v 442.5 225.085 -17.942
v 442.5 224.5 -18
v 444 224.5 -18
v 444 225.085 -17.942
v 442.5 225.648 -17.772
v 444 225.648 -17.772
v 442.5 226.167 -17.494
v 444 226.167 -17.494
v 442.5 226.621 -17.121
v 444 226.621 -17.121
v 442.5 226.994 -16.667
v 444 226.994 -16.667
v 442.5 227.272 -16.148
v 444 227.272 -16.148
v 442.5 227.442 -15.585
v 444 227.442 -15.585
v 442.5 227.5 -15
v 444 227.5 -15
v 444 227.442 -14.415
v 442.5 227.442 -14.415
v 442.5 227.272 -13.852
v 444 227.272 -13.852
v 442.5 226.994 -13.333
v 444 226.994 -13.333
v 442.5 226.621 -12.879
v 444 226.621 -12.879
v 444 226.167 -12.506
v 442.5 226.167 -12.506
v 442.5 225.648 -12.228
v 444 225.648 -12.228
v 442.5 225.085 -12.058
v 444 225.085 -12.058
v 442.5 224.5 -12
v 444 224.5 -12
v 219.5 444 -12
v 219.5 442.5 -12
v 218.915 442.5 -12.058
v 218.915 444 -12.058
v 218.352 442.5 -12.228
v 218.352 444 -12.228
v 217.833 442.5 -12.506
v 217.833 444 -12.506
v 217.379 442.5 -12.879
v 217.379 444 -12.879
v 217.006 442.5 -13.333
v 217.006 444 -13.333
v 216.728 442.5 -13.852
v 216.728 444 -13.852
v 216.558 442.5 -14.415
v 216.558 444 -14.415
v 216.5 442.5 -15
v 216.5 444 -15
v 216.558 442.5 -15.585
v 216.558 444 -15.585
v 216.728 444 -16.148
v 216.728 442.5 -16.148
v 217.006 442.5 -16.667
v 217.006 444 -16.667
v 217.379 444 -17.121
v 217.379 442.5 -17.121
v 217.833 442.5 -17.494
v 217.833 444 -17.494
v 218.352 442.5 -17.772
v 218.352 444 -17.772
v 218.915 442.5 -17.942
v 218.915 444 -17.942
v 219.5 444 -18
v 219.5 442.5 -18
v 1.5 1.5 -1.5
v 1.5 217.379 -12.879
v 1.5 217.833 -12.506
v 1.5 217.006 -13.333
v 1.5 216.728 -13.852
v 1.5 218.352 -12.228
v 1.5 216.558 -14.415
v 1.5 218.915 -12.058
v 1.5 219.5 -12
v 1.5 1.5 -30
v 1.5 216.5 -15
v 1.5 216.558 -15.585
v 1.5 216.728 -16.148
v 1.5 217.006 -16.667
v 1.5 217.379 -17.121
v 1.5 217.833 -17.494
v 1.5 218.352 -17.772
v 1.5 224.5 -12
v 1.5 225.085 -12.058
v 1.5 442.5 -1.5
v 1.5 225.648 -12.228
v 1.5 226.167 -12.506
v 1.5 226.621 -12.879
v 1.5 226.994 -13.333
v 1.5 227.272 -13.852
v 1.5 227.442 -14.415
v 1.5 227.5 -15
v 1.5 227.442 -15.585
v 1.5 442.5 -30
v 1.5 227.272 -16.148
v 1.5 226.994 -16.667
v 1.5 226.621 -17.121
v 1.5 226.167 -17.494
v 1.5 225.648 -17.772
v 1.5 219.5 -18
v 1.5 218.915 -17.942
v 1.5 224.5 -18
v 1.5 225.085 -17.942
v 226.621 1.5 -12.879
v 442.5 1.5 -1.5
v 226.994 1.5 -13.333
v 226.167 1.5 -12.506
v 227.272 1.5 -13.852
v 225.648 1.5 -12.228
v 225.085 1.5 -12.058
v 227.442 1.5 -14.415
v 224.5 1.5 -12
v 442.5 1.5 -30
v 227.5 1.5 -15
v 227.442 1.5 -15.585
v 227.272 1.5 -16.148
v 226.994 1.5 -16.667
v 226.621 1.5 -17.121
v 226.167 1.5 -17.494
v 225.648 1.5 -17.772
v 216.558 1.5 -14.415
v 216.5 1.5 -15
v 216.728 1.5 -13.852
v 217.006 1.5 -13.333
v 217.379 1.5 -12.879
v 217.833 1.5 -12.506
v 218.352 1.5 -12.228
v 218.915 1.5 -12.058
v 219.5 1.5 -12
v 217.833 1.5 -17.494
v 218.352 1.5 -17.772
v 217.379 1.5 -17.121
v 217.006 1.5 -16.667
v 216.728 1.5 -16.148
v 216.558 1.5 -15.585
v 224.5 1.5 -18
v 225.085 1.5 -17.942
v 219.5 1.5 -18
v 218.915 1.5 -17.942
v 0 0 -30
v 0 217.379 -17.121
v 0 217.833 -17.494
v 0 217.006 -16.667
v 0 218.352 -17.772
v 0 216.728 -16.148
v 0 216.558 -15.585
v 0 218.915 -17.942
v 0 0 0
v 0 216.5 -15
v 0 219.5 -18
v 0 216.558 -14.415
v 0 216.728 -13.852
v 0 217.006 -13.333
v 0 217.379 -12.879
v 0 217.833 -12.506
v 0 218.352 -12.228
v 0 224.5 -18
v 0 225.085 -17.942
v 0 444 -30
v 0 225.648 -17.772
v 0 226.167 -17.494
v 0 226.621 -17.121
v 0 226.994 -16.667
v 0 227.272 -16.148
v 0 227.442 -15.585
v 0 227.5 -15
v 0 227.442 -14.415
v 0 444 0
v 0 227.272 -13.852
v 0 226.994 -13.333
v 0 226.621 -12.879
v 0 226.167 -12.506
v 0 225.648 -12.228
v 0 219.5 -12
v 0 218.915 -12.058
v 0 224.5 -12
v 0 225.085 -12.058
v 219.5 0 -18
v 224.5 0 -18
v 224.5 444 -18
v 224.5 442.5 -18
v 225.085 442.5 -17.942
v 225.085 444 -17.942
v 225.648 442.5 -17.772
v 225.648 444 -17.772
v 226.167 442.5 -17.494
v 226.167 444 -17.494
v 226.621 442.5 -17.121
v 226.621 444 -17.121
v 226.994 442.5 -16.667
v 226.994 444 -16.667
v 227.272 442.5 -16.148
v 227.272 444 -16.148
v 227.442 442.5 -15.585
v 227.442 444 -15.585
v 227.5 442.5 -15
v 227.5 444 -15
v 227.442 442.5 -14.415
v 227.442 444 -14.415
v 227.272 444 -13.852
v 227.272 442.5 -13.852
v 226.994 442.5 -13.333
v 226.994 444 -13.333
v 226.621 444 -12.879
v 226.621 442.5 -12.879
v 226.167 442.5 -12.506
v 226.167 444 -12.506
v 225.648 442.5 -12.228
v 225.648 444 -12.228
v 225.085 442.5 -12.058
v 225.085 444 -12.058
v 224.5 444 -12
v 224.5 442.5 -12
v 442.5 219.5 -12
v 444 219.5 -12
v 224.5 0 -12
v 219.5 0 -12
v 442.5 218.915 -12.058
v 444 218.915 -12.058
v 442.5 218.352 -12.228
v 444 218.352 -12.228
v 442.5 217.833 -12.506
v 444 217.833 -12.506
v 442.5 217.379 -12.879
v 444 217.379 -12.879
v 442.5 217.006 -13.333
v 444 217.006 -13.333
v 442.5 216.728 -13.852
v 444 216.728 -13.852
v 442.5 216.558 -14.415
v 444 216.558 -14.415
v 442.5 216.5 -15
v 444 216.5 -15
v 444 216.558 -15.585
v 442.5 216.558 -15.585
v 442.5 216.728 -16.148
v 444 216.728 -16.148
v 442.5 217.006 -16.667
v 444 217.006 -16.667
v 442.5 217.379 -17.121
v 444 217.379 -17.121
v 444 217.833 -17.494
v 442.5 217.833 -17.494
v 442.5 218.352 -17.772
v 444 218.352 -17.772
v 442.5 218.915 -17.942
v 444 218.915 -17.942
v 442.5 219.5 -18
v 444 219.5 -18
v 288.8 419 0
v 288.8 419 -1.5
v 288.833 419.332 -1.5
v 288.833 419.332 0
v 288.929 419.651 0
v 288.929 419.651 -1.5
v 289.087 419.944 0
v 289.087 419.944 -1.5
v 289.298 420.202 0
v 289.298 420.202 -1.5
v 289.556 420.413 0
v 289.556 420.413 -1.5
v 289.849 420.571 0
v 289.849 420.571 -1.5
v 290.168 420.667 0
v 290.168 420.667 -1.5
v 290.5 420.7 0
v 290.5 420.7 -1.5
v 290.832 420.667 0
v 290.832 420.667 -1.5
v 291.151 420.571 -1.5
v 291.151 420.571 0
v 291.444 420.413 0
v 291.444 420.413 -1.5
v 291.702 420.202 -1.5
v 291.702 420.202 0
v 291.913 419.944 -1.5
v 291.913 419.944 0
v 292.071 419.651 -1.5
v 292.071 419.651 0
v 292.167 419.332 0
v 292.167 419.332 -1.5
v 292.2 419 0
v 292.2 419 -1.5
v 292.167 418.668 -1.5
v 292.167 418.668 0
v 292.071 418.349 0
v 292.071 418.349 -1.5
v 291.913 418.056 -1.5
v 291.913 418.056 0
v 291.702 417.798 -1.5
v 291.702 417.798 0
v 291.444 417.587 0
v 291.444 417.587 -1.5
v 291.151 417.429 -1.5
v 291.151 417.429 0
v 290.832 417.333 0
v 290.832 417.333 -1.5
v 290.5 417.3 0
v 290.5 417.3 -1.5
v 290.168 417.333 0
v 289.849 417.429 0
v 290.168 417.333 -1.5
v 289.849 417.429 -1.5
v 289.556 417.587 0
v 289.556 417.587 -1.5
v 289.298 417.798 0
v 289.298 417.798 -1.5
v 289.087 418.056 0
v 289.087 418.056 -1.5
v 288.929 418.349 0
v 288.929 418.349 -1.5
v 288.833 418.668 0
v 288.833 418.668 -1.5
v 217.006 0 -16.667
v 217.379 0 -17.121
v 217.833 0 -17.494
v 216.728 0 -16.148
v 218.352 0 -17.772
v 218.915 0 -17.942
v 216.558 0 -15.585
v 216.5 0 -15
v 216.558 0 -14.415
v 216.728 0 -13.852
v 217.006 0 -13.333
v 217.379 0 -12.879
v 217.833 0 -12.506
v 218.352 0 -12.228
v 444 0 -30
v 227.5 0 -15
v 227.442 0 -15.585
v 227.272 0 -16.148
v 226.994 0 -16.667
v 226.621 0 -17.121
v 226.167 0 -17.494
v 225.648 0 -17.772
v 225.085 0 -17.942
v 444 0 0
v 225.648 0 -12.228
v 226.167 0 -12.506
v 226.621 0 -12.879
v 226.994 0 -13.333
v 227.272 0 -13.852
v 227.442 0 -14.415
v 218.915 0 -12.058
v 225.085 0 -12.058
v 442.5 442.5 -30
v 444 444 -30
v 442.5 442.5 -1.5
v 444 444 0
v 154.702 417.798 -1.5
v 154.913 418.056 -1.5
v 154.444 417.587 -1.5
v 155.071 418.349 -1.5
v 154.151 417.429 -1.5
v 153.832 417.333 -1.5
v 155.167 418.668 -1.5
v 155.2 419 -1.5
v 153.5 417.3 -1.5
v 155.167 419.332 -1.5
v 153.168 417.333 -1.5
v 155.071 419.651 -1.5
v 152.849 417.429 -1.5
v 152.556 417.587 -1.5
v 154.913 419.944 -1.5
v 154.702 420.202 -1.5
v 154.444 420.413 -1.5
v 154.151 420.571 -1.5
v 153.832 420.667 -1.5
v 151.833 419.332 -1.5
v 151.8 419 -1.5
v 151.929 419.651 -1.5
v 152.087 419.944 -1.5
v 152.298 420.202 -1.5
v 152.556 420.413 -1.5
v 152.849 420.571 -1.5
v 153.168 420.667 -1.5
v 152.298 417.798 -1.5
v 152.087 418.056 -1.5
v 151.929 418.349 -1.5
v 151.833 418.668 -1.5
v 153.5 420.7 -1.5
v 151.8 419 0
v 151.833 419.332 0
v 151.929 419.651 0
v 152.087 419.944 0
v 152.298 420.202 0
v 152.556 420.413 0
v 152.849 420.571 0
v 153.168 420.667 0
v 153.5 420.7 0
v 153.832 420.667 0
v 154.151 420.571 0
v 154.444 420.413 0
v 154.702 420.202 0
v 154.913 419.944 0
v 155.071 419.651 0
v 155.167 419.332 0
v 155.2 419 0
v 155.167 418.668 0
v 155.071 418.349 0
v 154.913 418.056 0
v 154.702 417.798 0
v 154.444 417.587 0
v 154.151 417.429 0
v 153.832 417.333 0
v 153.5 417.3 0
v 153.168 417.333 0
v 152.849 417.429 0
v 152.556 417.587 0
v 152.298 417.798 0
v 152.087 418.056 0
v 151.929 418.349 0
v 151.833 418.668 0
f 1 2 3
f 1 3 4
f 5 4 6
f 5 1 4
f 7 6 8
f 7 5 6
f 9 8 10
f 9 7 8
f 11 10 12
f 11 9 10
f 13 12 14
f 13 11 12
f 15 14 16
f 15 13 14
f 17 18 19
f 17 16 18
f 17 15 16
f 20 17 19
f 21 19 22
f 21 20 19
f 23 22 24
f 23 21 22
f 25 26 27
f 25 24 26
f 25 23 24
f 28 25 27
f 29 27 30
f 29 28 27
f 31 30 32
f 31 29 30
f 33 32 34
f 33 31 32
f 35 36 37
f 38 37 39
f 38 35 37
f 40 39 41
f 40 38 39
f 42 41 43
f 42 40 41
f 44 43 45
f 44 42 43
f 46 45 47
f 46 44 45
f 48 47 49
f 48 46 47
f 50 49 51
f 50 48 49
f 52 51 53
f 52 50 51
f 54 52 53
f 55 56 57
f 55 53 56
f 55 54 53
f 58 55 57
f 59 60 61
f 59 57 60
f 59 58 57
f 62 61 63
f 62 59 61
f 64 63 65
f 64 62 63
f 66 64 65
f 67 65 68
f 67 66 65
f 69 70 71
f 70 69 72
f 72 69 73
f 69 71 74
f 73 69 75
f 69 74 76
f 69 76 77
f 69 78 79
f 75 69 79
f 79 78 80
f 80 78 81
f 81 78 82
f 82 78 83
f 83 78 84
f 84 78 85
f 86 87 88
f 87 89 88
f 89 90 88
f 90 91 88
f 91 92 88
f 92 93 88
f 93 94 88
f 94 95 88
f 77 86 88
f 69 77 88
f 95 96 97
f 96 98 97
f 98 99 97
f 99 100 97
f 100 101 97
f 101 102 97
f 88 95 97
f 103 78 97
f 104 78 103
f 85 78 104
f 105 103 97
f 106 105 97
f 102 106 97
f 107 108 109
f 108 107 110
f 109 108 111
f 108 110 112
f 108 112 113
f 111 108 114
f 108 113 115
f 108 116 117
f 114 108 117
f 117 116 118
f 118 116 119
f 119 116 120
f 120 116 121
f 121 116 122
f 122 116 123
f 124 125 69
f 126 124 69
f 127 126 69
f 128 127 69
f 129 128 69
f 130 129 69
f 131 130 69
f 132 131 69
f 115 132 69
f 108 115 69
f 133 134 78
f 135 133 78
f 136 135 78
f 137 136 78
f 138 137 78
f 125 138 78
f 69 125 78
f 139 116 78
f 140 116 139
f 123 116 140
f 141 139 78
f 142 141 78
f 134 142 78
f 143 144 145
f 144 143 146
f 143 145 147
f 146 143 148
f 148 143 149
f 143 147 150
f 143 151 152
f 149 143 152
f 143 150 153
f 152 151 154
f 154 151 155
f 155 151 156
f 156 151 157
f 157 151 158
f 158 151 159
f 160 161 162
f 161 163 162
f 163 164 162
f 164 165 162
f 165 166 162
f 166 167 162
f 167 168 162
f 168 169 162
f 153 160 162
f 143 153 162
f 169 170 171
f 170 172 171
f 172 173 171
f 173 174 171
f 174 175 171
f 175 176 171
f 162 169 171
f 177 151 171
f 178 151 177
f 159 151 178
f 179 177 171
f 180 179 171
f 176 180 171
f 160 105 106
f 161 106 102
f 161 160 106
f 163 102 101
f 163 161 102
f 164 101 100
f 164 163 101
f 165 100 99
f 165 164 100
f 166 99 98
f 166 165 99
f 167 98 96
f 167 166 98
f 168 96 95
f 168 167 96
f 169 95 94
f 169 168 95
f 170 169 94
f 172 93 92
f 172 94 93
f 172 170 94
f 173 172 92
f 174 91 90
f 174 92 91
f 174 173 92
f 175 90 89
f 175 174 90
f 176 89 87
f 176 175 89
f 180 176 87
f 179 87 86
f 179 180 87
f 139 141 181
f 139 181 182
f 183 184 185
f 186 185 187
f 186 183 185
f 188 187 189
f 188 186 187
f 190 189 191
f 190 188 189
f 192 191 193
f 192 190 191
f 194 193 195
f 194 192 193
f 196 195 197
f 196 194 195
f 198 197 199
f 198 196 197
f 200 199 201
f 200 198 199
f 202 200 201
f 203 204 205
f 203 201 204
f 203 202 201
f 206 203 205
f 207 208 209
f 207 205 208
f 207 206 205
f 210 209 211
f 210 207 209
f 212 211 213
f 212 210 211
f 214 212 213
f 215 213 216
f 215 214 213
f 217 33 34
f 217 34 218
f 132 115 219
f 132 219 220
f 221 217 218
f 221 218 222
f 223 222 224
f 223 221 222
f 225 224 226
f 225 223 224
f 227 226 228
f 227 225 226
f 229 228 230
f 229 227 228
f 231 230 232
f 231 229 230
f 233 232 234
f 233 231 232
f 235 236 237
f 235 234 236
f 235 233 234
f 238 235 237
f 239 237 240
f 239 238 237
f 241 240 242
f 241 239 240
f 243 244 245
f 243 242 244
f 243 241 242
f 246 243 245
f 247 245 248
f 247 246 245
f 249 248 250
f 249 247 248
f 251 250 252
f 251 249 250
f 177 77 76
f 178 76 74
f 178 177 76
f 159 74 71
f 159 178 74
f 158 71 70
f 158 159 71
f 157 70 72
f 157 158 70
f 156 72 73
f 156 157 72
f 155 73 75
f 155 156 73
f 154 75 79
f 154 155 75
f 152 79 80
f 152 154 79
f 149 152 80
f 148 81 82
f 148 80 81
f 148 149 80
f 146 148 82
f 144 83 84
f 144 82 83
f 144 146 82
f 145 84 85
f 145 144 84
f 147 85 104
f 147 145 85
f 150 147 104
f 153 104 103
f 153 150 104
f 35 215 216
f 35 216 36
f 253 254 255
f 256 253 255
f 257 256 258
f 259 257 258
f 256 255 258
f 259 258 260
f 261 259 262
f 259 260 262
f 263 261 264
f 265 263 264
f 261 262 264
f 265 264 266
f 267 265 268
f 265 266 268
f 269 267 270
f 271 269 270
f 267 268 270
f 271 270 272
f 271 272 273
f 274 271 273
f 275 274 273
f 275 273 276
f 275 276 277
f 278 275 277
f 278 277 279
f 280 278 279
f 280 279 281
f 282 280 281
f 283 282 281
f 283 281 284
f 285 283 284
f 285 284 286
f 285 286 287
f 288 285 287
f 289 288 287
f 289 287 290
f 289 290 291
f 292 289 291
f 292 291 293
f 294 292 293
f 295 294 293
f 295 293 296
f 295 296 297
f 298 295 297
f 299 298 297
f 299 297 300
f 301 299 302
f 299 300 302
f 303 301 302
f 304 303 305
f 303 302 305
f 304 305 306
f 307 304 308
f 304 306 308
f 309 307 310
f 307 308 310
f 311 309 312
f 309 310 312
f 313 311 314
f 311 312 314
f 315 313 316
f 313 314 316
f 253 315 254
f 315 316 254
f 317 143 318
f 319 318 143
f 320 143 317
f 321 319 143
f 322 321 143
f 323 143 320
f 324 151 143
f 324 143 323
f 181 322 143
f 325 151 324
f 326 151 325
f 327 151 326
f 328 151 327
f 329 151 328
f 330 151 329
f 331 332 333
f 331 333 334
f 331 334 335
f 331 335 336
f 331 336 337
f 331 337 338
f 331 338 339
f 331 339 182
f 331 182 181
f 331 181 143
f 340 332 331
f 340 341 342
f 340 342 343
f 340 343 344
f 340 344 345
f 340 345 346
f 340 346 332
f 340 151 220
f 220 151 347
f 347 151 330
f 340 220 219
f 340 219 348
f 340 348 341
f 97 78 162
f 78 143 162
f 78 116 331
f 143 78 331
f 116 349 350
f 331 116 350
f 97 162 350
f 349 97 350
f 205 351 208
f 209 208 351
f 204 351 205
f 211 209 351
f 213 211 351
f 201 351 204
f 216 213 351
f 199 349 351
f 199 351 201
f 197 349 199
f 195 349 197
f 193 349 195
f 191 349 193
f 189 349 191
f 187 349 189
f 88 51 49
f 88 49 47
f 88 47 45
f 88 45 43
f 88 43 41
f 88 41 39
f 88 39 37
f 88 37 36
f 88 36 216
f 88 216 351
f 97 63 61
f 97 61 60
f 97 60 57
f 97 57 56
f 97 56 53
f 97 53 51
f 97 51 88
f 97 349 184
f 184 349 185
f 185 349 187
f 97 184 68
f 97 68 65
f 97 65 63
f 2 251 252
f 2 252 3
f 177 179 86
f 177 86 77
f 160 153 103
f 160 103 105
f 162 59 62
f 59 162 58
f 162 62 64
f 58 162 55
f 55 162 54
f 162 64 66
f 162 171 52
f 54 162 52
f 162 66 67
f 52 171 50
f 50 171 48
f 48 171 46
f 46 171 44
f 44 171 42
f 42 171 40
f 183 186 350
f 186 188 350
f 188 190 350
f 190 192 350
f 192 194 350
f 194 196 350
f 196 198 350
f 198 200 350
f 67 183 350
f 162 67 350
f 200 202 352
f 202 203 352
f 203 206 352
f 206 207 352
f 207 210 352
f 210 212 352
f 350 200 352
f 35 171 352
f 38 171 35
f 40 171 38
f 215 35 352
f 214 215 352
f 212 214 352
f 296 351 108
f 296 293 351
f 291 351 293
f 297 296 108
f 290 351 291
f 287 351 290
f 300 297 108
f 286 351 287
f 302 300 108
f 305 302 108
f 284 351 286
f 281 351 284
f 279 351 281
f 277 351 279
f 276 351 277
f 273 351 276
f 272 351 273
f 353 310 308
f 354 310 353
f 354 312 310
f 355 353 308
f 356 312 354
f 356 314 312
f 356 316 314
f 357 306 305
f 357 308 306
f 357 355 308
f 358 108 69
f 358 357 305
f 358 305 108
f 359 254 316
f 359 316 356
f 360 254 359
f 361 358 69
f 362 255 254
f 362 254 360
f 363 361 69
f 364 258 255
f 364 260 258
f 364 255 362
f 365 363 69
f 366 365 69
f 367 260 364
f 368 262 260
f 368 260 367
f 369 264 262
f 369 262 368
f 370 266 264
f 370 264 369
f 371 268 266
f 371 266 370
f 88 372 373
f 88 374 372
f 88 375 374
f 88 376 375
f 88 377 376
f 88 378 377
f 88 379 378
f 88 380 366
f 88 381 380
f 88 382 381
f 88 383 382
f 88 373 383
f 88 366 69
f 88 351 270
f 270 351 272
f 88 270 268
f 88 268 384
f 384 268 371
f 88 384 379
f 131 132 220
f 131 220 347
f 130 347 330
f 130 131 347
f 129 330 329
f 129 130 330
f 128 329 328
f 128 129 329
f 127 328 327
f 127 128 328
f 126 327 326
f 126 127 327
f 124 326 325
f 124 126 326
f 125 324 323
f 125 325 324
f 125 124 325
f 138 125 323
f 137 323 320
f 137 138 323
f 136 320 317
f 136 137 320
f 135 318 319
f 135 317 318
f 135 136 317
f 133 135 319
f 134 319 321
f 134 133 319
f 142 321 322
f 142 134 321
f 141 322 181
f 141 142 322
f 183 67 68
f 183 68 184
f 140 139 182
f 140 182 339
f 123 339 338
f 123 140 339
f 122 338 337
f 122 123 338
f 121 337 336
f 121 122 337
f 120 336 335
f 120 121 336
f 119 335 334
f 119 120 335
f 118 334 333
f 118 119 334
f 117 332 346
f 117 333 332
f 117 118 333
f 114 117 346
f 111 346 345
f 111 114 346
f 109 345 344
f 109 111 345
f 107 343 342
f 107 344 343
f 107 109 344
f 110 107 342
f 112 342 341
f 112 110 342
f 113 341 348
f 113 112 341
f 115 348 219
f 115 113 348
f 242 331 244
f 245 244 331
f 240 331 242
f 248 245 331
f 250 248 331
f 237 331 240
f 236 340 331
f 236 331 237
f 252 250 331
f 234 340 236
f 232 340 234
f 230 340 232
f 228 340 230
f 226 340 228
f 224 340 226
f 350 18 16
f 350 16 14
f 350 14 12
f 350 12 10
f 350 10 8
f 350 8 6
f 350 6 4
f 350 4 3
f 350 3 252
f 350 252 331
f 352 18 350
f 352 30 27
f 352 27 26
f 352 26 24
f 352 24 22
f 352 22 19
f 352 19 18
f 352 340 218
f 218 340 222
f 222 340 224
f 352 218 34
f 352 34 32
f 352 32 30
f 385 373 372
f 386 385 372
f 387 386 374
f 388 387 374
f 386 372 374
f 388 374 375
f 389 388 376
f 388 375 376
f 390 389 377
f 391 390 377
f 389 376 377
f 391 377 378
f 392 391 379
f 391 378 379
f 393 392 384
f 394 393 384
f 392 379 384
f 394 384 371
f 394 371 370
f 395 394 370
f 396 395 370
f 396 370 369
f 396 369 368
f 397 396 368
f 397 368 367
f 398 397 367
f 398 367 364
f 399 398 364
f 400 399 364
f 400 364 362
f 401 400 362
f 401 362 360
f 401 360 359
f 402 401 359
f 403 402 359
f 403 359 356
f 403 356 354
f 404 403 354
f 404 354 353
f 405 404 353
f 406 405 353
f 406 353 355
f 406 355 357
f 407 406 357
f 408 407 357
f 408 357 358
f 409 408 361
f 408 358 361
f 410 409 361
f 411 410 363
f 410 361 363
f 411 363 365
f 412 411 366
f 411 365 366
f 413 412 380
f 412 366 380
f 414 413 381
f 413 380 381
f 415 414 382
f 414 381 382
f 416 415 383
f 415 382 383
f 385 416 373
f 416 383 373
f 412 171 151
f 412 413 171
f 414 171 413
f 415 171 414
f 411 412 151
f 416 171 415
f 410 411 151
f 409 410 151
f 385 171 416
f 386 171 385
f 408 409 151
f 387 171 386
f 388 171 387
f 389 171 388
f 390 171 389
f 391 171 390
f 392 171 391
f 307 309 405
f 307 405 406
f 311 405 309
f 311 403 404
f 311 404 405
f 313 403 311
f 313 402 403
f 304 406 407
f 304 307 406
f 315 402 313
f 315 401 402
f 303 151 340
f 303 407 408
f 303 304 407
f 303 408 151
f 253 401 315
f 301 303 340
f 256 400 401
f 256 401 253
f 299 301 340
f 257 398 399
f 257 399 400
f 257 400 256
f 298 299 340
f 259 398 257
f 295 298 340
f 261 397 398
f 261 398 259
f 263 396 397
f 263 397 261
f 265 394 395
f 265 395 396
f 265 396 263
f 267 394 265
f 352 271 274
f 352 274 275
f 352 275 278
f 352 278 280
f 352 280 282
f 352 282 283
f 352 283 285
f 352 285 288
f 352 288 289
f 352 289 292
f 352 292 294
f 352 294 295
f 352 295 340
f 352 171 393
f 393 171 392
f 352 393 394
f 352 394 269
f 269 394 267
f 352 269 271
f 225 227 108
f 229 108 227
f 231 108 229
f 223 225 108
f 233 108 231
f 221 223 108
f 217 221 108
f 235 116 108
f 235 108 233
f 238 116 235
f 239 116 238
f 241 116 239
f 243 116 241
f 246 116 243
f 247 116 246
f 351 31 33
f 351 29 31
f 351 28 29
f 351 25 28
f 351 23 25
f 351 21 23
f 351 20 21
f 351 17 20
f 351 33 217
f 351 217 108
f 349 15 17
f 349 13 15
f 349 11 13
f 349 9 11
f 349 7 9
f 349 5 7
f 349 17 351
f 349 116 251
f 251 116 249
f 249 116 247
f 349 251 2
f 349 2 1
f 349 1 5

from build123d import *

# Parameters (mm, degrees)
SCHIZZO1_W                   = 444
SCHIZZO1_H                   = 444
ESTRUSIONE_ESTRUSIONE1_DEPTH = 30
SCHIZZO2_R                   = 1.7
TAGLIO_ESTRUSIONE1_DEPTH     = 629.627075459
SCHIZZO3_W                   = 441
SCHIZZO3_H                   = 441
TAGLIO_ESTRUSIONE2_DEPTH     = 28.5
TAGLIO_ESTRUSIONE3_DEPTH     = 629.627075459
TAGLIO_ESTRUSIONE4_DEPTH     = 629.627075459


with BuildPart() as part:
    # Schizzo1 → Estrusione-Estrusione1 (new body)
    with BuildSketch(Plane.XY):
        with Locations((222, 222)):
            Rectangle(SCHIZZO1_W, SCHIZZO1_H)
    extrude(amount=-ESTRUSIONE_ESTRUSIONE1_DEPTH)

    # Schizzo2 → Taglio-Estrusione1 (cut, through all)
    with BuildSketch(Plane(origin=(0, 0, -30), x_dir=(-1, 0, 0), z_dir=(0, 0, -1))):
        with Locations((-290.5, 419)):
            Circle(SCHIZZO2_R)
        with Locations((-153.5, 419)):
            Circle(SCHIZZO2_R)
    extrude(amount=-TAGLIO_ESTRUSIONE1_DEPTH, mode=Mode.SUBTRACT)

    # Schizzo3 → Taglio-Estrusione2 (cut)
    with BuildSketch(Plane(origin=(0, 0, -30), x_dir=(-1, 0, 0), z_dir=(0, 0, -1))):
        with Locations((-222, 222)):
            Rectangle(SCHIZZO3_W, SCHIZZO3_H)
    extrude(amount=-TAGLIO_ESTRUSIONE2_DEPTH, mode=Mode.SUBTRACT)

    # Schizzo4 → Taglio-Estrusione3 (cut, through all)
    with BuildSketch(Plane(origin=(0, 444, 0), x_dir=(1, 0, 0), z_dir=(0, 1, 0))):
        with BuildLine():
            Line((224.5, 12), (219.5, 12))
            ThreePointArc((219.5, 12), (216.5, 15), (219.5, 18))
            Line((219.5, 18), (224.5, 18))
            ThreePointArc((224.5, 18), (227.5, 15), (224.5, 12))
        make_face()
    extrude(amount=-TAGLIO_ESTRUSIONE3_DEPTH, mode=Mode.SUBTRACT)

    # Schizzo5 → Taglio-Estrusione4 (cut, through all)
    with BuildSketch(Plane.ZY):
        with BuildLine():
            Line((-12, 224.5), (-12, 219.5))
            ThreePointArc((-12, 219.5), (-15, 216.5), (-18, 219.5))
            Line((-18, 219.5), (-18, 224.5))
            ThreePointArc((-18, 224.5), (-15, 227.5), (-12, 224.5))
        make_face()
    extrude(amount=-TAGLIO_ESTRUSIONE4_DEPTH, mode=Mode.SUBTRACT)


solid = part.part
